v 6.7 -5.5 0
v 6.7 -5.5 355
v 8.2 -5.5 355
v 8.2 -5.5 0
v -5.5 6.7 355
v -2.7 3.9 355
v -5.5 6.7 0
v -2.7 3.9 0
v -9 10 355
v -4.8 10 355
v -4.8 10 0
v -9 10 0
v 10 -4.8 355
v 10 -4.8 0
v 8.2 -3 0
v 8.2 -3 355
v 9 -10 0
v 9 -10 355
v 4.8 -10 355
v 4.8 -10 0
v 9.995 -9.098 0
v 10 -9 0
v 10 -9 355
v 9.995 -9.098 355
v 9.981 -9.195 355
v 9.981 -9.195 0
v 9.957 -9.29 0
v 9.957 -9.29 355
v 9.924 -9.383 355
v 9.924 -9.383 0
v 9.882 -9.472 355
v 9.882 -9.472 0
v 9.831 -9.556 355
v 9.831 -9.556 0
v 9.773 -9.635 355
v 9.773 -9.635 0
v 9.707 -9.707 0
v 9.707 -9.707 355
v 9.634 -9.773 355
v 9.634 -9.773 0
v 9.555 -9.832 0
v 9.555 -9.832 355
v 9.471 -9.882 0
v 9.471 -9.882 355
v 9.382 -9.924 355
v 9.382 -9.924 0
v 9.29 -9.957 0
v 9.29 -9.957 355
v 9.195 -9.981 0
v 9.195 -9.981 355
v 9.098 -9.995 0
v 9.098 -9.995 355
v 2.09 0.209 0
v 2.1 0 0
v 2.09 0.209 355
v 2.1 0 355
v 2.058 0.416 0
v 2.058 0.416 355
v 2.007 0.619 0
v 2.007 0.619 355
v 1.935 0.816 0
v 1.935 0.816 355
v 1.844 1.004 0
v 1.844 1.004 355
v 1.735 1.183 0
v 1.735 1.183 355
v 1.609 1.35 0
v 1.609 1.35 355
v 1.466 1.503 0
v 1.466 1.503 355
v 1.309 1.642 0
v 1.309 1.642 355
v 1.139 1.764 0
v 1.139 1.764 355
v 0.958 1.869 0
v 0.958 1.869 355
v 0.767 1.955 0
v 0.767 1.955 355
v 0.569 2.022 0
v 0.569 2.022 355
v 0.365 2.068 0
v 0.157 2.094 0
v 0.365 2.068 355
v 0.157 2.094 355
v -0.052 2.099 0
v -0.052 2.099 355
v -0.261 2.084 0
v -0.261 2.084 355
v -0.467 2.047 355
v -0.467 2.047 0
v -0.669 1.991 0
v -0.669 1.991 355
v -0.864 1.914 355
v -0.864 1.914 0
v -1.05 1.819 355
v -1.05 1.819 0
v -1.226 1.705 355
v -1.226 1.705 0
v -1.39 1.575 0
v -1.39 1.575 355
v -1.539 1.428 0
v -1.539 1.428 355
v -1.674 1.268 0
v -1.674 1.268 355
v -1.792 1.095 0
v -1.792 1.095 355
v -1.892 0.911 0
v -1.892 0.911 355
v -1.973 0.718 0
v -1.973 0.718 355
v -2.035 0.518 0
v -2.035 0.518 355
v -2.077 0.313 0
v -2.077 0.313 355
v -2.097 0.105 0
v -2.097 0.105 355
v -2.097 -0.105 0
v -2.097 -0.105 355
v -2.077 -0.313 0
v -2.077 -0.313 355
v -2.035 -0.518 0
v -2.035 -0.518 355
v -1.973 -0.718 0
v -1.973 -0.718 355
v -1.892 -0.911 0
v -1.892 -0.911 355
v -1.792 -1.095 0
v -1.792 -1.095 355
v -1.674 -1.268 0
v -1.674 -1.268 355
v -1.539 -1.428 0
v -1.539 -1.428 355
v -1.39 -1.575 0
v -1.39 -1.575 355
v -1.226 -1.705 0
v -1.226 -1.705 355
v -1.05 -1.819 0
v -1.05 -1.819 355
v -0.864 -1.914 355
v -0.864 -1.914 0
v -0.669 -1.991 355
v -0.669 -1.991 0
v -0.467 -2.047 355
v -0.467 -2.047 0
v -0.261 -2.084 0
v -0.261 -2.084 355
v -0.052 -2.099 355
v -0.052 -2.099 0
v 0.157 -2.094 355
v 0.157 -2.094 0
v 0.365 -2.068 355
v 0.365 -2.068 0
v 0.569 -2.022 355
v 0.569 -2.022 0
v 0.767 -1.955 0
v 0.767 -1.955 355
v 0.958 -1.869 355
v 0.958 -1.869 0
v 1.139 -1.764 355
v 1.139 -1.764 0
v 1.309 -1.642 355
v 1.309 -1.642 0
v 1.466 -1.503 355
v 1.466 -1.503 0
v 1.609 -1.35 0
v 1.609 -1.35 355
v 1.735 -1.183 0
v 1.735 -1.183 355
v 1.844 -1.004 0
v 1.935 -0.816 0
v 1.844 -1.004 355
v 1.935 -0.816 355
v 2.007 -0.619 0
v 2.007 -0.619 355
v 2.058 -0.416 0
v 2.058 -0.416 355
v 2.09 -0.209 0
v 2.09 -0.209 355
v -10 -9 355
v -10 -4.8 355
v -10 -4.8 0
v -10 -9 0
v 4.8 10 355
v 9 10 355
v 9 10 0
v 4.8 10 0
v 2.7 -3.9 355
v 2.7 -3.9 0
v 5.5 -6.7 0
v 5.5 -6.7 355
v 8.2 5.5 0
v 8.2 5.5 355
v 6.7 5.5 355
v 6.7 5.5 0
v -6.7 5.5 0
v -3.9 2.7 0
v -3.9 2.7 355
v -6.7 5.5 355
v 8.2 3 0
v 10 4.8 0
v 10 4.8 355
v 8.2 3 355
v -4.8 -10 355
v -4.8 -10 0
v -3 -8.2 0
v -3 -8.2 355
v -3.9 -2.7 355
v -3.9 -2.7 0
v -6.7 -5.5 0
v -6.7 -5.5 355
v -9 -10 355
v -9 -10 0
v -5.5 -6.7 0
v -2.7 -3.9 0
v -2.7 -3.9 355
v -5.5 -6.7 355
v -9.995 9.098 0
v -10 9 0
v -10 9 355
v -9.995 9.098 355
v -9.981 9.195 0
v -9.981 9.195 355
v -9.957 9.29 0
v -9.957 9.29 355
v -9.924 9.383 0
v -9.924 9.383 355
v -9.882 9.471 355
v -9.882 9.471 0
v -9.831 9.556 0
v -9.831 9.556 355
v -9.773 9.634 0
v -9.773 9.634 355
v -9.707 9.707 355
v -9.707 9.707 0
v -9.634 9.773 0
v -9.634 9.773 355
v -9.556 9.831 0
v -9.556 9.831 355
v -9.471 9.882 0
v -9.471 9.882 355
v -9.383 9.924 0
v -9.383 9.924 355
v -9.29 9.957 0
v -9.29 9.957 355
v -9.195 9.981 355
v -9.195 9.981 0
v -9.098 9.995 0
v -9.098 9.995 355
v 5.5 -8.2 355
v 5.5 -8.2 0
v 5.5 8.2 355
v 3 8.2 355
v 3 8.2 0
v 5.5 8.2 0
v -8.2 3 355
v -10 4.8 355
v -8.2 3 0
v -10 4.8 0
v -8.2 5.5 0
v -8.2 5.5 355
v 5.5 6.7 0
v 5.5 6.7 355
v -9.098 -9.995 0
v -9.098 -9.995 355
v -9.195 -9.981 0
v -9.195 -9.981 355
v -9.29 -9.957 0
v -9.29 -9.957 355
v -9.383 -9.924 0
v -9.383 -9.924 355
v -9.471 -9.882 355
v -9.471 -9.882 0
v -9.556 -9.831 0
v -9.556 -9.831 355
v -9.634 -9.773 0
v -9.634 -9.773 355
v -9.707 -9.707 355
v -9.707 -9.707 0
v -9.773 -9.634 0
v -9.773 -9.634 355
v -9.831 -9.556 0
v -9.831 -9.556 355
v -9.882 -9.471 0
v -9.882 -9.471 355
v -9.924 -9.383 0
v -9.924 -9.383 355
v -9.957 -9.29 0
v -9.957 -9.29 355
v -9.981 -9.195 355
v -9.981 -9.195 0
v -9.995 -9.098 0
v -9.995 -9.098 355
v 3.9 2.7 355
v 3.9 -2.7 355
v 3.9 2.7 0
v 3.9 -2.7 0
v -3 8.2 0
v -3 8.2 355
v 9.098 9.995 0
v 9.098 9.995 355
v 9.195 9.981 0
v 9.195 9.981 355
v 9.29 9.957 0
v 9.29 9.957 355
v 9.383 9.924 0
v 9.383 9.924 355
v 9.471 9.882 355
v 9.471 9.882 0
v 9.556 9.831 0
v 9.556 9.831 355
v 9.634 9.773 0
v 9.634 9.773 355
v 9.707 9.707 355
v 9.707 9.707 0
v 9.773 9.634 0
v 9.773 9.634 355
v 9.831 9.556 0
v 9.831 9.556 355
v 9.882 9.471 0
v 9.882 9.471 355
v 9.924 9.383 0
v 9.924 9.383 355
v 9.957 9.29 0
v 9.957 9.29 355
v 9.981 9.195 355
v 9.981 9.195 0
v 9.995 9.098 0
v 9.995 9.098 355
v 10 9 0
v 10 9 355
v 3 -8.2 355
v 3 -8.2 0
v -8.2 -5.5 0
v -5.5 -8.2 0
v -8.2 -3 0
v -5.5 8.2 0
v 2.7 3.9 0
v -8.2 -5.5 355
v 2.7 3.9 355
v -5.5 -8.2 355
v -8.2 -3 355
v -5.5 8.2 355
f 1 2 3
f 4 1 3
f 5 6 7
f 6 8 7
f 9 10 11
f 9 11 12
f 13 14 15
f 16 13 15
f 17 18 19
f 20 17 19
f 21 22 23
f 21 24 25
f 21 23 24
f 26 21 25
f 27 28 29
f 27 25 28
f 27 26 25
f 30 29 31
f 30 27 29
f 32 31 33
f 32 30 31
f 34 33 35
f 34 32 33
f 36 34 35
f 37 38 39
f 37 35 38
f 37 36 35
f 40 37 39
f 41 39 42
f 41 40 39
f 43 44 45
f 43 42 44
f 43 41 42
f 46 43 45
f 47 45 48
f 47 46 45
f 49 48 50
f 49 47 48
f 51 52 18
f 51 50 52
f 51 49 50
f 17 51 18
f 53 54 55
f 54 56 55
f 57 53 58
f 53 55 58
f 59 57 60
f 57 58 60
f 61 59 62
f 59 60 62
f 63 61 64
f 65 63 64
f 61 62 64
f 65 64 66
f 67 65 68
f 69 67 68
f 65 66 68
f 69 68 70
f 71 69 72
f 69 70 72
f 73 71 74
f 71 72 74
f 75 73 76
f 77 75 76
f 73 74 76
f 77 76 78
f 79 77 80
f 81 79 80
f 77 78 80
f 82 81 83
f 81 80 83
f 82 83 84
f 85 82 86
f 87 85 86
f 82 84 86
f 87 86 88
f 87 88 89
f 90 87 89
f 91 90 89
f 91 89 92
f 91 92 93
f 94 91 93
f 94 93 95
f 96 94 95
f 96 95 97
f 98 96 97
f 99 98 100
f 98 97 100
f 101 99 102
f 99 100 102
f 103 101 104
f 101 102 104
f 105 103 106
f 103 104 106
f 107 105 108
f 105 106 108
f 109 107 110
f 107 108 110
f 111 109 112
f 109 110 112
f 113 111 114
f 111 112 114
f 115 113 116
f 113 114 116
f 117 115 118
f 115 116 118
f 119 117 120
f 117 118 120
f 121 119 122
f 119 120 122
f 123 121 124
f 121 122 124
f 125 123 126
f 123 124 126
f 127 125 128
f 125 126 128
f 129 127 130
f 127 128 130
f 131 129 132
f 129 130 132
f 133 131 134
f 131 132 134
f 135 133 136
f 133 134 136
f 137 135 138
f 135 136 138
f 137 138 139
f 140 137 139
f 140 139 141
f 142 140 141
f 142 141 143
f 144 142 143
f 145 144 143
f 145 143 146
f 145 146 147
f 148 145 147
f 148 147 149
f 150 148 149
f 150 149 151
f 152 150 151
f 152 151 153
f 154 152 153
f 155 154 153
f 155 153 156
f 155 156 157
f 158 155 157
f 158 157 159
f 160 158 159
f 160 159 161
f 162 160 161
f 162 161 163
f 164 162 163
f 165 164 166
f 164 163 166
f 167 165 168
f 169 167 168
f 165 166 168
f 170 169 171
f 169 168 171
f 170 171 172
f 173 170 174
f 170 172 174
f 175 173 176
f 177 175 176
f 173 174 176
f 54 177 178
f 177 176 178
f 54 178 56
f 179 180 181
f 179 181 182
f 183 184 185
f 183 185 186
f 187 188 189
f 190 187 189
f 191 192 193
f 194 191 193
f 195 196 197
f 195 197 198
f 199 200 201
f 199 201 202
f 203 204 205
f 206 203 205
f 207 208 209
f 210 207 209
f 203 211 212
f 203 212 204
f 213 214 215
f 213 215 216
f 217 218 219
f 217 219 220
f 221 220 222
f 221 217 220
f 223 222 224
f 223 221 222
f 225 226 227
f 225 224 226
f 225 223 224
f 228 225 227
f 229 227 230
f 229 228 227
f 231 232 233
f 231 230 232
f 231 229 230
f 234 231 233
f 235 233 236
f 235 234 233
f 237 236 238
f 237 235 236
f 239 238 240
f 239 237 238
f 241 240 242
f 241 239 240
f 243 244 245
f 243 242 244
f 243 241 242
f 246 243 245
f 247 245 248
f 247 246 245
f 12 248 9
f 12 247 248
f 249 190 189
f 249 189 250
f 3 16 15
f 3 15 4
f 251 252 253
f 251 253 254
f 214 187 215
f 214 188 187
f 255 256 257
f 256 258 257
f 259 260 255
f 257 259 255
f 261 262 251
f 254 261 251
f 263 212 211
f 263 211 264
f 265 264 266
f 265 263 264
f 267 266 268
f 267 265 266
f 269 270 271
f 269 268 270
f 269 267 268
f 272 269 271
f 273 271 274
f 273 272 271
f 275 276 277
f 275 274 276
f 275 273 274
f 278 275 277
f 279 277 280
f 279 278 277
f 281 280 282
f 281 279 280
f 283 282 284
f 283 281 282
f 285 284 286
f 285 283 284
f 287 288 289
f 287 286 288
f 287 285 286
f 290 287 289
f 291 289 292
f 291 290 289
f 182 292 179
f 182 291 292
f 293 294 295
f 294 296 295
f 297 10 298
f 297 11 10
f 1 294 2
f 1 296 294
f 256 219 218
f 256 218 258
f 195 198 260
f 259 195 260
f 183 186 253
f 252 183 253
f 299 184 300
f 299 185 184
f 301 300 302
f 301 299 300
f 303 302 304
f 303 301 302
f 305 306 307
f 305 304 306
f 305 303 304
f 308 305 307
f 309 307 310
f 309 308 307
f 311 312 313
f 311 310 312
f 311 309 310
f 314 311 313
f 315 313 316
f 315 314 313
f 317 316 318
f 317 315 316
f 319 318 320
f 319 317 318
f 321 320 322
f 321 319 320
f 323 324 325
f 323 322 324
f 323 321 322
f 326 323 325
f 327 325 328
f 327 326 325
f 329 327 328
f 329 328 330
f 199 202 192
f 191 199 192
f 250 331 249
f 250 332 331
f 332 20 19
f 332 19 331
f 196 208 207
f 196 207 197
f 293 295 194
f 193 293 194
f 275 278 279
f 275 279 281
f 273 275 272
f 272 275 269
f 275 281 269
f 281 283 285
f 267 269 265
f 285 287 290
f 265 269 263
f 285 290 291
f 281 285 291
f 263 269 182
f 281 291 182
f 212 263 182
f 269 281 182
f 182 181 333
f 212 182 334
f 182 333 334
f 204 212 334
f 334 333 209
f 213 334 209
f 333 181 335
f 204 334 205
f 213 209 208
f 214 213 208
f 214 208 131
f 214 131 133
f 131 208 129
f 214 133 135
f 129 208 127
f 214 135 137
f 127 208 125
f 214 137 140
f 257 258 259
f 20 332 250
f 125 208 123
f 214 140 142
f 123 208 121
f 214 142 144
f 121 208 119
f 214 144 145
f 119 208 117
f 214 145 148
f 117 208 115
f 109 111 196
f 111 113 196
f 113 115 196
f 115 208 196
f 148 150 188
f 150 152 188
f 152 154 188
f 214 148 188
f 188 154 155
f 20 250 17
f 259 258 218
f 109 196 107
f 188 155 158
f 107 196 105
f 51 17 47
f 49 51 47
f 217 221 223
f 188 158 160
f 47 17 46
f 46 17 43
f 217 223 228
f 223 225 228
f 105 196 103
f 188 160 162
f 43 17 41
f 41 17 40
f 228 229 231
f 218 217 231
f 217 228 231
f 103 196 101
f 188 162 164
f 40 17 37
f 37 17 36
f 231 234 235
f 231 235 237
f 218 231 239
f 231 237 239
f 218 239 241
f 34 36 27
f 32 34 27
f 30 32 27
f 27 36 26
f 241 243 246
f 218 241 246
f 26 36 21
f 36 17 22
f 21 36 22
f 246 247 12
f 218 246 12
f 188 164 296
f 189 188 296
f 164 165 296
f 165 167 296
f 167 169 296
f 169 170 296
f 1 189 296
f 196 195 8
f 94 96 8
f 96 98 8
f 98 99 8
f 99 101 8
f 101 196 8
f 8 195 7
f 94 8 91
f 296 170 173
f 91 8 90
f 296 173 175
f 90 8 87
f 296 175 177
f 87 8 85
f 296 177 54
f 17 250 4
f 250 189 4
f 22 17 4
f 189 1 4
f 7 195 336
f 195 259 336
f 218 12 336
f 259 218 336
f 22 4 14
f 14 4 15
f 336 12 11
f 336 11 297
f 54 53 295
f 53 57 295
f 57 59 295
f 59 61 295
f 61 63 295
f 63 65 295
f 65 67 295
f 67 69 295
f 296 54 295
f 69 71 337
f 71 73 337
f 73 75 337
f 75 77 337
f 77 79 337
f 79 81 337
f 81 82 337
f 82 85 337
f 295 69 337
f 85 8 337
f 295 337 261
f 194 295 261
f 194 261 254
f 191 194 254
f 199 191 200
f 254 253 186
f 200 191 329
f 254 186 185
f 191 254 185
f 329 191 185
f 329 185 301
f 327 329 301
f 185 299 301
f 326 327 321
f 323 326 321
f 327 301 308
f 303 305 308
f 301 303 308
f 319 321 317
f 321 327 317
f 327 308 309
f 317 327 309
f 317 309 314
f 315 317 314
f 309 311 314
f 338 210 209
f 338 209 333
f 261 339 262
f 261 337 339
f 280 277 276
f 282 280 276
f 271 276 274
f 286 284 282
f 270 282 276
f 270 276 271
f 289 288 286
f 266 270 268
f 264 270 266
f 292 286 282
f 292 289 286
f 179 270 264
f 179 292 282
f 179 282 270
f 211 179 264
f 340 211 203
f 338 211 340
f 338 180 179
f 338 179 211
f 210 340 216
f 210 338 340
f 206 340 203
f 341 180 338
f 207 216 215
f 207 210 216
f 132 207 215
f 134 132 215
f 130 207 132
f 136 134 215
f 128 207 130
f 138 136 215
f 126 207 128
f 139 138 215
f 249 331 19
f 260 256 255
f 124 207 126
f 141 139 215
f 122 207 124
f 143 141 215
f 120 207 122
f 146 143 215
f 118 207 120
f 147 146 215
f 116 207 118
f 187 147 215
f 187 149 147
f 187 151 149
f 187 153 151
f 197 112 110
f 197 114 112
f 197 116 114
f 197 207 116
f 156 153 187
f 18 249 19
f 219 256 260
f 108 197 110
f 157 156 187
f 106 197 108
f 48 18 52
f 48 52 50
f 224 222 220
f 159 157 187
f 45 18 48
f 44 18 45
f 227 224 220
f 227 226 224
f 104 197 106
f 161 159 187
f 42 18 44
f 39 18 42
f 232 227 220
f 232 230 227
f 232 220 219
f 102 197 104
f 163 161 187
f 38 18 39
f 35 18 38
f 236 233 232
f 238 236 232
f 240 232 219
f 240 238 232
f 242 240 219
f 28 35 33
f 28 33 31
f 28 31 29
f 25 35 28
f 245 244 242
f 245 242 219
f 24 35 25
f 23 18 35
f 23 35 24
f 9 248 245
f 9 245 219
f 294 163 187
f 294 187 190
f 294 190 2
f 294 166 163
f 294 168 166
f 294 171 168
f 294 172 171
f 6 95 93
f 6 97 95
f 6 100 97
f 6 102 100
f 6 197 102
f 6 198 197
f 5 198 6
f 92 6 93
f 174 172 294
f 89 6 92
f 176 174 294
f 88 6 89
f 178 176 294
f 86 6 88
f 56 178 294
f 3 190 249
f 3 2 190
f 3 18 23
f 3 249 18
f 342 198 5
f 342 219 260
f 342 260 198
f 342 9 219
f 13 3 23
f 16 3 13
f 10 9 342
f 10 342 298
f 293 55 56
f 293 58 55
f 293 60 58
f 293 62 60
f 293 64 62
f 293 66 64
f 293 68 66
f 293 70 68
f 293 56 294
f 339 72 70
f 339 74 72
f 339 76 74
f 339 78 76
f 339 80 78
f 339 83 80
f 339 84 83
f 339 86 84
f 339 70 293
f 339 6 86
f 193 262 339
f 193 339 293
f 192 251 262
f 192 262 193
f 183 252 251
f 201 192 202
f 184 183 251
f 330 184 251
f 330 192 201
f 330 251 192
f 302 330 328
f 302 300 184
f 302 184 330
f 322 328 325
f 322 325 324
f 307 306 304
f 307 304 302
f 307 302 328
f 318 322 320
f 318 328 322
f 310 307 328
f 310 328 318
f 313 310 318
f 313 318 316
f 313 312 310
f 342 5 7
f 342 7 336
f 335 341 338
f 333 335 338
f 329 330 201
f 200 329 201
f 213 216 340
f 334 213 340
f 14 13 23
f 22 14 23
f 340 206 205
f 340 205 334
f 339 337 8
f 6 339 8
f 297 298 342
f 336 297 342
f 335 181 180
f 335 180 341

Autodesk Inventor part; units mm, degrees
ref_plane "YZ Plane" through (0, 0, 0) normal (1, 0, 0) x (0, 1, 0)
ref_plane "XZ Plane" through (0, 0, 0) normal (0, 1, 0) x (-1, 0, 0)
ref_plane "XY Plane" through (0, 0, 0) normal (0, 0, 1) x (1, 0, 0)
sketch "Эскиз1" plane through (0, 0, 0) normal (0, 0, 1) x (1, 0, 0)
  line L0 (-4.8, 10) -> (-3, 8.2)
  line L1 (-4.8, 10) -> (-2.2544, 10) construction
  line L2 (4.8, 10) -> (3, 8.2)
  line L3 (4.8, 10) -> (7.3456, 10) construction
  line L4 (10, 4.8) -> (8.2, 3)
  arc A0 (-9, 10) -> (-10, 9) centre (-9, 9) ccw
  arc A1 (10, 9) -> (9, 10) centre (9, 9) ccw
  arc A2 (-10, -9) -> (-9, -10) centre (-9, -9) ccw
  arc A3 (8.9996, -10) -> (10, -9) centre (9, -9) ccw
  line L5 (0, 3.9) -> (-2.7, 3.9)
  line L6 (0, 3.9) -> (2.7, 3.9)
  line L7 (3, 8.2) -> (5.5, 8.2)
  line L8 (2.7, 3.9) -> (5.5, 6.7)
  line L9 (5.5, 6.7) -> (5.5, 8.2)
  line L10 (3.9, 0) -> (3.9, 2.7)
  line L11 (3.9, 0) -> (3.9, -2.7)
  line L12 (3.9, 2.7) -> (6.7, 5.5)
  line L13 (3.9, 2.7) -> (7.8598, 2.7) construction
  line L14 (9, 10) -> (4.8, 10)
  line L15 (-4.8, 10) -> (-9, 10)
  line L16 (0, -3.9) -> (-2.7, -3.9)
  line L17 (0, -3.9) -> (2.7, -3.9)
  line L18 (-3.9, 0) -> (-3.9, -2.7)
  line L19 (-3.9, 0) -> (-3.9, 2.7)
  line L20 (8.2, 3) -> (8.2, 5.5)
  line L21 (8.2, 5.5) -> (6.7, 5.5)
  line L22 (-10, -4.8) -> (-7.4544, -4.8) construction
  line L23 (-4.8, -10) -> (-3, -8.2)
  line L24 (-4.8, -10) -> (-2.2544, -10) construction
  line L25 (4.7996, -10) -> (2.9996, -8.2)
  line L26 (4.7996, -10) -> (7.3452, -10) construction
  line L27 (10, -4.8) -> (8.2, -3)
  line L28 (8.9996, -10) -> (4.7996, -10)
  line L29 (-9, -10) -> (-4.8, -10)
  line L30 (10, -4.8) -> (10, -9)
  line L31 (10, 9) -> (10, 4.8)
  line L32 (-10, -4.8) -> (-10, -9)
  line L33 (-3, 8.2) -> (-5.5, 8.2)
  line L34 (-2.7, 3.9) -> (-5.5, 6.7)
  line L35 (-2.7, 3.9) -> (1.2598, 3.9) construction
  line L36 (-5.5, 6.7) -> (-5.5, 8.2)
  line L37 (-3.9, 2.7) -> (-6.7, 5.5)
  line L38 (-6.7, 5.5) -> (-8.2, 5.5)
  line L39 (-8.2, -3) -> (-8.2, -5.5)
  line L40 (-3, -8.2) -> (-5.5, -8.2)
  line L41 (2.9996, -8.2) -> (5.5, -8.2)
  line L42 (8.2, -3) -> (8.2, -5.5)
  line L43 (-3.9, -2.7) -> (-6.7, -5.5)
  line L44 (-6.7, -5.5) -> (-8.2, -5.5)
  line L45 (-2.7, -3.9) -> (-5.5, -6.7)
  line L46 (-5.5, -6.7) -> (-5.5, -8.2)
  line L47 (-10, 9) -> (-10, 4.8)
  line L48 (-10, 4.8) -> (-8.2, 3)
  line L49 (-8.2, 5.5) -> (-8.2, 3)
  line L50 (-10, -4.8) -> (-8.2, -3)
  line L51 (2.7, -3.9) -> (5.5, -6.7)
  line L52 (5.5, -6.7) -> (5.5, -8.2)
  line L53 (3.9, -2.7) -> (6.7, -5.5)
  line L54 (6.7, -5.5) -> (8.2, -5.5)
  point P0 (0, 0)
  dimension "d16" = 45
  dimension "d17" = 135
  dimension "d25" = 6
  dimension "d29" = 1
  dimension "d30" = 1
  dimension "d31" = 2.7
  dimension "d32" = 2.7
  dimension "d34" = 2.5
  dimension "d36" = 2.7
  dimension "d37" = 2.7
  dimension "d38" = 3.9
  dimension "d39" = 45
  dimension "d42" = 2.7
  dimension "d43" = 2.7
  dimension "d44" = 3.9
  dimension "d45" = 2.7
  dimension "d46" = 2.7
  dimension "d48" = 10
  dimension "d49" = 10
  dimension "d55" = 4.5
  dimension "d58" = 9
  dimension "d59" = 9
  dimension "d60" = 2.5
  dimension "d61" = 2.8
  dimension "d63" = 1.6971
  dimension "d65" = 45
  dimension "d67" = 135
  dimension "d73" = 10
  dimension "d74" = 10
  dimension "d77" = 18
  dimension "d78" = 18
  dimension "d79" = 135
  dimension "d80" = 135
  dimension "d81" = 4.5
  dimension "d82" = 1.8
  dimension "d83" = 1.8
  dimension "d84" = 1
  dimension "d85" = 1
  dimension "d87" = 4.5
  dimension "d89" = 1.8
  dimension "d91" = 135
  dimension "d92" = 1.6971
  dimension "d94" = 4.5
  dimension "d95" = 1.8
  dimension "d96" = 4.5
  dimension "d97" = 1.8
  dimension "d98" = 4.5
  dimension "d99" = 1.8
  dimension "d100" = 1.8
  dimension "d107" = 4.2
  dimension "d108" = 10
  dimension "d109" = 4.5
  dimension "d110" = 1.8
  dimension "d111" = 135
  dimension "d112" = 4.2
  dimension "d113" = 4.2
  dimension "d114" = 6
  dimension "d115" = 135
  dimension "d116" = 1.6971
  dimension "d117" = 4.2
  dimension "d118" = 4.2
  dimension "d119" = 4.5
  dimension "d120" = 135
  dimension "d121" = 1.5
extrude "Выдавливание2" add sketch "Эскиз1" along normal blind 355
sketch "Эскиз2" plane through (0, 0, 355) normal (0, 0, 1) x (1, 0, 0)
  circle A0 centre (0, 0) radius 2.1
  dimension "d131" = 4.2
extrude "Выдавливание3" cut sketch "Эскиз2" against normal through all
properties part number "Профиль_аллюминиевый355"
